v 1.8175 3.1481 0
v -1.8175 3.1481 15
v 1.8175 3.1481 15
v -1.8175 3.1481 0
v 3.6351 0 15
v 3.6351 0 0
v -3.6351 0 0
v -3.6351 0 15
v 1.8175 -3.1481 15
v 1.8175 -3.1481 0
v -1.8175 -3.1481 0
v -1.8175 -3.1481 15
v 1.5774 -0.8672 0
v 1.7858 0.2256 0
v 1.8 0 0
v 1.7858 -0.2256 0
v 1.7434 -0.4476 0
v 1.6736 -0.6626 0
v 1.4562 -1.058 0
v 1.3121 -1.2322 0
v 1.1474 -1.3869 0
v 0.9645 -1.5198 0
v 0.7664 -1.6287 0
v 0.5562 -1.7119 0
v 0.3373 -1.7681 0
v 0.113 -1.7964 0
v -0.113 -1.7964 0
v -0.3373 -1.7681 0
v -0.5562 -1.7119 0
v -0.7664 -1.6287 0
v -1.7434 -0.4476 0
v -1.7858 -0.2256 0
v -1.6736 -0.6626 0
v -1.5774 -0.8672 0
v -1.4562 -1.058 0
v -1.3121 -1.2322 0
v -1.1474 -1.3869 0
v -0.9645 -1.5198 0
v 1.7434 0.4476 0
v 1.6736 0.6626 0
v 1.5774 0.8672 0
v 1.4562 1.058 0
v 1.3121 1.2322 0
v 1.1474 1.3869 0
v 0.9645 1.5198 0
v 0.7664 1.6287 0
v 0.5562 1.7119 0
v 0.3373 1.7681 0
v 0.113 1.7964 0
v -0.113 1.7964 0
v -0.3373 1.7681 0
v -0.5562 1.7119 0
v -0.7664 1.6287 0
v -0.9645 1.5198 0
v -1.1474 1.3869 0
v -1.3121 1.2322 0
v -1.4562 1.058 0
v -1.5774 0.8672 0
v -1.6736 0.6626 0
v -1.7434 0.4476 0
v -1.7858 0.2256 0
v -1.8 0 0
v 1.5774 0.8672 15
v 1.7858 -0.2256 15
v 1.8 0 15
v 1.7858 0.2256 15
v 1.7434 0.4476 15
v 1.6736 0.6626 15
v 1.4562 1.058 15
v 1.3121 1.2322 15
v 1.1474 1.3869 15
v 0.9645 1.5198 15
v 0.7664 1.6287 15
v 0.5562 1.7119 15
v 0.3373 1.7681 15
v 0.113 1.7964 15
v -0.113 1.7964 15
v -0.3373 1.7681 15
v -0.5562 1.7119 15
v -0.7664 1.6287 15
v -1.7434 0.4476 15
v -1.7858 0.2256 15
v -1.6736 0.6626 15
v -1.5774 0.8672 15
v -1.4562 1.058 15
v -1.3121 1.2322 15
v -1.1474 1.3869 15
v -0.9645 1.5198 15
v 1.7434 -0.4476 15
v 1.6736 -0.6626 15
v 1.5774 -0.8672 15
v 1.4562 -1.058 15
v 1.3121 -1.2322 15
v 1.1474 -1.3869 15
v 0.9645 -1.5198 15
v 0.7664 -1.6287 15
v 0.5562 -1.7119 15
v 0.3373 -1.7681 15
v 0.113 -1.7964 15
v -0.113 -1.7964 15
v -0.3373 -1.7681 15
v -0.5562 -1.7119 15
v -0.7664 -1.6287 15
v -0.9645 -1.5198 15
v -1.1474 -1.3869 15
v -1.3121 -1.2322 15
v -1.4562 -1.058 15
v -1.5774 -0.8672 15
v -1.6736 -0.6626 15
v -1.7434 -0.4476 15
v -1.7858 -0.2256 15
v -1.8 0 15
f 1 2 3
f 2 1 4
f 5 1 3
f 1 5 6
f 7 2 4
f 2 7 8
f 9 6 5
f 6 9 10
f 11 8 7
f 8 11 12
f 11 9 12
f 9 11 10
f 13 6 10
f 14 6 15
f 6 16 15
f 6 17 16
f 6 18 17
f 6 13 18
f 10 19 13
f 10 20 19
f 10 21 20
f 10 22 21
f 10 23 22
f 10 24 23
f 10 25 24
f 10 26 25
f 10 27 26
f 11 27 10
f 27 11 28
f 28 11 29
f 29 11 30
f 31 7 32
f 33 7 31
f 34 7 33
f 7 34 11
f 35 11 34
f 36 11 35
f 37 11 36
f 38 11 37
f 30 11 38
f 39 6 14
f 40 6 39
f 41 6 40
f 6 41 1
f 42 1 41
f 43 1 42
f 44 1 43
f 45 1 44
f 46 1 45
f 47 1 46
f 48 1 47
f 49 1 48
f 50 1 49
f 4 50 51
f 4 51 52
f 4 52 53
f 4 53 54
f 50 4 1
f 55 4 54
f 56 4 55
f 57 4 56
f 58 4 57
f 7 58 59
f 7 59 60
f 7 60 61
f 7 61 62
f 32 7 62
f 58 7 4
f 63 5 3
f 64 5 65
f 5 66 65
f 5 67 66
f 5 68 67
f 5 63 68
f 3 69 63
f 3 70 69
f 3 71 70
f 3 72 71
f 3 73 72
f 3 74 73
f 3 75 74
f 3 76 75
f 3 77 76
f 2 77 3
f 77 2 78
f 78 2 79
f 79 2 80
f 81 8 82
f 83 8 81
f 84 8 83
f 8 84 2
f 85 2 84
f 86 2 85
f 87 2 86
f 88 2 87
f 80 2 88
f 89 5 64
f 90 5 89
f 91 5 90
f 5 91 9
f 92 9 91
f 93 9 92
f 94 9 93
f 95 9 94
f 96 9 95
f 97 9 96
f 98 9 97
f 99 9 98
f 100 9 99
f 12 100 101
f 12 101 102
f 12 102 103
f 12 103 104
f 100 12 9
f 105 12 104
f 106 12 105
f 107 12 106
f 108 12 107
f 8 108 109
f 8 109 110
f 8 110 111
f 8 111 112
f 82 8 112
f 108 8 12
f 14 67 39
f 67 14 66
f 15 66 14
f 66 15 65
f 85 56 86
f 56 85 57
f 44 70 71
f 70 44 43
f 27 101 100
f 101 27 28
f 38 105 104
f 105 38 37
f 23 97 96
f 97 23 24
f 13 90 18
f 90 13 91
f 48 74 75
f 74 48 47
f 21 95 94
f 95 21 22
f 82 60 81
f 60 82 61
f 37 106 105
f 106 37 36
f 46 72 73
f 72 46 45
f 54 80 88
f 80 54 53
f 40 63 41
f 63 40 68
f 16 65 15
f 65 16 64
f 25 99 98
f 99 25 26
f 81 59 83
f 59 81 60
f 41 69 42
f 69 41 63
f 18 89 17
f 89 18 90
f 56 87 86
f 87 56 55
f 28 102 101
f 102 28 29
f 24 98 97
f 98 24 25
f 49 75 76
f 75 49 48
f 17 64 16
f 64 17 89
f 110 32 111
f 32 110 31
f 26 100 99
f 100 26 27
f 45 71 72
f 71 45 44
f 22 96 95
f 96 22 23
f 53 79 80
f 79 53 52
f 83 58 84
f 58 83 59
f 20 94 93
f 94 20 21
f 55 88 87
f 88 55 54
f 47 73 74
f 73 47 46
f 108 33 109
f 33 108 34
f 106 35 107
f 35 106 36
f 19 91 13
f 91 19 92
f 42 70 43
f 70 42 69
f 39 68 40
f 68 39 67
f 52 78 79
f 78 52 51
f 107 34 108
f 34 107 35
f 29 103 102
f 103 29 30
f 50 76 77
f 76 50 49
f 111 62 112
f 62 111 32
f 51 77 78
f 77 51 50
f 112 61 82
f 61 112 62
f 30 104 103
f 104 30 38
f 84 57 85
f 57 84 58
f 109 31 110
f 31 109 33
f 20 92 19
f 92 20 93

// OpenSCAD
$fn = 50;


difference() {
	union() {
		linear_extrude(height = 15) {
			polygon(points = [[3.6351000000, 0.0000000000], [1.8175500000, 3.1480889453], [-1.8175500000, 3.1480889453], [-3.6351000000, 0.0000000000], [-1.8175500000, -3.1480889453], [1.8175500000, -3.1480889453]]);
		}
	}
	union() {
		cylinder(h = 15, r = 1.8000000000);
	}
}
